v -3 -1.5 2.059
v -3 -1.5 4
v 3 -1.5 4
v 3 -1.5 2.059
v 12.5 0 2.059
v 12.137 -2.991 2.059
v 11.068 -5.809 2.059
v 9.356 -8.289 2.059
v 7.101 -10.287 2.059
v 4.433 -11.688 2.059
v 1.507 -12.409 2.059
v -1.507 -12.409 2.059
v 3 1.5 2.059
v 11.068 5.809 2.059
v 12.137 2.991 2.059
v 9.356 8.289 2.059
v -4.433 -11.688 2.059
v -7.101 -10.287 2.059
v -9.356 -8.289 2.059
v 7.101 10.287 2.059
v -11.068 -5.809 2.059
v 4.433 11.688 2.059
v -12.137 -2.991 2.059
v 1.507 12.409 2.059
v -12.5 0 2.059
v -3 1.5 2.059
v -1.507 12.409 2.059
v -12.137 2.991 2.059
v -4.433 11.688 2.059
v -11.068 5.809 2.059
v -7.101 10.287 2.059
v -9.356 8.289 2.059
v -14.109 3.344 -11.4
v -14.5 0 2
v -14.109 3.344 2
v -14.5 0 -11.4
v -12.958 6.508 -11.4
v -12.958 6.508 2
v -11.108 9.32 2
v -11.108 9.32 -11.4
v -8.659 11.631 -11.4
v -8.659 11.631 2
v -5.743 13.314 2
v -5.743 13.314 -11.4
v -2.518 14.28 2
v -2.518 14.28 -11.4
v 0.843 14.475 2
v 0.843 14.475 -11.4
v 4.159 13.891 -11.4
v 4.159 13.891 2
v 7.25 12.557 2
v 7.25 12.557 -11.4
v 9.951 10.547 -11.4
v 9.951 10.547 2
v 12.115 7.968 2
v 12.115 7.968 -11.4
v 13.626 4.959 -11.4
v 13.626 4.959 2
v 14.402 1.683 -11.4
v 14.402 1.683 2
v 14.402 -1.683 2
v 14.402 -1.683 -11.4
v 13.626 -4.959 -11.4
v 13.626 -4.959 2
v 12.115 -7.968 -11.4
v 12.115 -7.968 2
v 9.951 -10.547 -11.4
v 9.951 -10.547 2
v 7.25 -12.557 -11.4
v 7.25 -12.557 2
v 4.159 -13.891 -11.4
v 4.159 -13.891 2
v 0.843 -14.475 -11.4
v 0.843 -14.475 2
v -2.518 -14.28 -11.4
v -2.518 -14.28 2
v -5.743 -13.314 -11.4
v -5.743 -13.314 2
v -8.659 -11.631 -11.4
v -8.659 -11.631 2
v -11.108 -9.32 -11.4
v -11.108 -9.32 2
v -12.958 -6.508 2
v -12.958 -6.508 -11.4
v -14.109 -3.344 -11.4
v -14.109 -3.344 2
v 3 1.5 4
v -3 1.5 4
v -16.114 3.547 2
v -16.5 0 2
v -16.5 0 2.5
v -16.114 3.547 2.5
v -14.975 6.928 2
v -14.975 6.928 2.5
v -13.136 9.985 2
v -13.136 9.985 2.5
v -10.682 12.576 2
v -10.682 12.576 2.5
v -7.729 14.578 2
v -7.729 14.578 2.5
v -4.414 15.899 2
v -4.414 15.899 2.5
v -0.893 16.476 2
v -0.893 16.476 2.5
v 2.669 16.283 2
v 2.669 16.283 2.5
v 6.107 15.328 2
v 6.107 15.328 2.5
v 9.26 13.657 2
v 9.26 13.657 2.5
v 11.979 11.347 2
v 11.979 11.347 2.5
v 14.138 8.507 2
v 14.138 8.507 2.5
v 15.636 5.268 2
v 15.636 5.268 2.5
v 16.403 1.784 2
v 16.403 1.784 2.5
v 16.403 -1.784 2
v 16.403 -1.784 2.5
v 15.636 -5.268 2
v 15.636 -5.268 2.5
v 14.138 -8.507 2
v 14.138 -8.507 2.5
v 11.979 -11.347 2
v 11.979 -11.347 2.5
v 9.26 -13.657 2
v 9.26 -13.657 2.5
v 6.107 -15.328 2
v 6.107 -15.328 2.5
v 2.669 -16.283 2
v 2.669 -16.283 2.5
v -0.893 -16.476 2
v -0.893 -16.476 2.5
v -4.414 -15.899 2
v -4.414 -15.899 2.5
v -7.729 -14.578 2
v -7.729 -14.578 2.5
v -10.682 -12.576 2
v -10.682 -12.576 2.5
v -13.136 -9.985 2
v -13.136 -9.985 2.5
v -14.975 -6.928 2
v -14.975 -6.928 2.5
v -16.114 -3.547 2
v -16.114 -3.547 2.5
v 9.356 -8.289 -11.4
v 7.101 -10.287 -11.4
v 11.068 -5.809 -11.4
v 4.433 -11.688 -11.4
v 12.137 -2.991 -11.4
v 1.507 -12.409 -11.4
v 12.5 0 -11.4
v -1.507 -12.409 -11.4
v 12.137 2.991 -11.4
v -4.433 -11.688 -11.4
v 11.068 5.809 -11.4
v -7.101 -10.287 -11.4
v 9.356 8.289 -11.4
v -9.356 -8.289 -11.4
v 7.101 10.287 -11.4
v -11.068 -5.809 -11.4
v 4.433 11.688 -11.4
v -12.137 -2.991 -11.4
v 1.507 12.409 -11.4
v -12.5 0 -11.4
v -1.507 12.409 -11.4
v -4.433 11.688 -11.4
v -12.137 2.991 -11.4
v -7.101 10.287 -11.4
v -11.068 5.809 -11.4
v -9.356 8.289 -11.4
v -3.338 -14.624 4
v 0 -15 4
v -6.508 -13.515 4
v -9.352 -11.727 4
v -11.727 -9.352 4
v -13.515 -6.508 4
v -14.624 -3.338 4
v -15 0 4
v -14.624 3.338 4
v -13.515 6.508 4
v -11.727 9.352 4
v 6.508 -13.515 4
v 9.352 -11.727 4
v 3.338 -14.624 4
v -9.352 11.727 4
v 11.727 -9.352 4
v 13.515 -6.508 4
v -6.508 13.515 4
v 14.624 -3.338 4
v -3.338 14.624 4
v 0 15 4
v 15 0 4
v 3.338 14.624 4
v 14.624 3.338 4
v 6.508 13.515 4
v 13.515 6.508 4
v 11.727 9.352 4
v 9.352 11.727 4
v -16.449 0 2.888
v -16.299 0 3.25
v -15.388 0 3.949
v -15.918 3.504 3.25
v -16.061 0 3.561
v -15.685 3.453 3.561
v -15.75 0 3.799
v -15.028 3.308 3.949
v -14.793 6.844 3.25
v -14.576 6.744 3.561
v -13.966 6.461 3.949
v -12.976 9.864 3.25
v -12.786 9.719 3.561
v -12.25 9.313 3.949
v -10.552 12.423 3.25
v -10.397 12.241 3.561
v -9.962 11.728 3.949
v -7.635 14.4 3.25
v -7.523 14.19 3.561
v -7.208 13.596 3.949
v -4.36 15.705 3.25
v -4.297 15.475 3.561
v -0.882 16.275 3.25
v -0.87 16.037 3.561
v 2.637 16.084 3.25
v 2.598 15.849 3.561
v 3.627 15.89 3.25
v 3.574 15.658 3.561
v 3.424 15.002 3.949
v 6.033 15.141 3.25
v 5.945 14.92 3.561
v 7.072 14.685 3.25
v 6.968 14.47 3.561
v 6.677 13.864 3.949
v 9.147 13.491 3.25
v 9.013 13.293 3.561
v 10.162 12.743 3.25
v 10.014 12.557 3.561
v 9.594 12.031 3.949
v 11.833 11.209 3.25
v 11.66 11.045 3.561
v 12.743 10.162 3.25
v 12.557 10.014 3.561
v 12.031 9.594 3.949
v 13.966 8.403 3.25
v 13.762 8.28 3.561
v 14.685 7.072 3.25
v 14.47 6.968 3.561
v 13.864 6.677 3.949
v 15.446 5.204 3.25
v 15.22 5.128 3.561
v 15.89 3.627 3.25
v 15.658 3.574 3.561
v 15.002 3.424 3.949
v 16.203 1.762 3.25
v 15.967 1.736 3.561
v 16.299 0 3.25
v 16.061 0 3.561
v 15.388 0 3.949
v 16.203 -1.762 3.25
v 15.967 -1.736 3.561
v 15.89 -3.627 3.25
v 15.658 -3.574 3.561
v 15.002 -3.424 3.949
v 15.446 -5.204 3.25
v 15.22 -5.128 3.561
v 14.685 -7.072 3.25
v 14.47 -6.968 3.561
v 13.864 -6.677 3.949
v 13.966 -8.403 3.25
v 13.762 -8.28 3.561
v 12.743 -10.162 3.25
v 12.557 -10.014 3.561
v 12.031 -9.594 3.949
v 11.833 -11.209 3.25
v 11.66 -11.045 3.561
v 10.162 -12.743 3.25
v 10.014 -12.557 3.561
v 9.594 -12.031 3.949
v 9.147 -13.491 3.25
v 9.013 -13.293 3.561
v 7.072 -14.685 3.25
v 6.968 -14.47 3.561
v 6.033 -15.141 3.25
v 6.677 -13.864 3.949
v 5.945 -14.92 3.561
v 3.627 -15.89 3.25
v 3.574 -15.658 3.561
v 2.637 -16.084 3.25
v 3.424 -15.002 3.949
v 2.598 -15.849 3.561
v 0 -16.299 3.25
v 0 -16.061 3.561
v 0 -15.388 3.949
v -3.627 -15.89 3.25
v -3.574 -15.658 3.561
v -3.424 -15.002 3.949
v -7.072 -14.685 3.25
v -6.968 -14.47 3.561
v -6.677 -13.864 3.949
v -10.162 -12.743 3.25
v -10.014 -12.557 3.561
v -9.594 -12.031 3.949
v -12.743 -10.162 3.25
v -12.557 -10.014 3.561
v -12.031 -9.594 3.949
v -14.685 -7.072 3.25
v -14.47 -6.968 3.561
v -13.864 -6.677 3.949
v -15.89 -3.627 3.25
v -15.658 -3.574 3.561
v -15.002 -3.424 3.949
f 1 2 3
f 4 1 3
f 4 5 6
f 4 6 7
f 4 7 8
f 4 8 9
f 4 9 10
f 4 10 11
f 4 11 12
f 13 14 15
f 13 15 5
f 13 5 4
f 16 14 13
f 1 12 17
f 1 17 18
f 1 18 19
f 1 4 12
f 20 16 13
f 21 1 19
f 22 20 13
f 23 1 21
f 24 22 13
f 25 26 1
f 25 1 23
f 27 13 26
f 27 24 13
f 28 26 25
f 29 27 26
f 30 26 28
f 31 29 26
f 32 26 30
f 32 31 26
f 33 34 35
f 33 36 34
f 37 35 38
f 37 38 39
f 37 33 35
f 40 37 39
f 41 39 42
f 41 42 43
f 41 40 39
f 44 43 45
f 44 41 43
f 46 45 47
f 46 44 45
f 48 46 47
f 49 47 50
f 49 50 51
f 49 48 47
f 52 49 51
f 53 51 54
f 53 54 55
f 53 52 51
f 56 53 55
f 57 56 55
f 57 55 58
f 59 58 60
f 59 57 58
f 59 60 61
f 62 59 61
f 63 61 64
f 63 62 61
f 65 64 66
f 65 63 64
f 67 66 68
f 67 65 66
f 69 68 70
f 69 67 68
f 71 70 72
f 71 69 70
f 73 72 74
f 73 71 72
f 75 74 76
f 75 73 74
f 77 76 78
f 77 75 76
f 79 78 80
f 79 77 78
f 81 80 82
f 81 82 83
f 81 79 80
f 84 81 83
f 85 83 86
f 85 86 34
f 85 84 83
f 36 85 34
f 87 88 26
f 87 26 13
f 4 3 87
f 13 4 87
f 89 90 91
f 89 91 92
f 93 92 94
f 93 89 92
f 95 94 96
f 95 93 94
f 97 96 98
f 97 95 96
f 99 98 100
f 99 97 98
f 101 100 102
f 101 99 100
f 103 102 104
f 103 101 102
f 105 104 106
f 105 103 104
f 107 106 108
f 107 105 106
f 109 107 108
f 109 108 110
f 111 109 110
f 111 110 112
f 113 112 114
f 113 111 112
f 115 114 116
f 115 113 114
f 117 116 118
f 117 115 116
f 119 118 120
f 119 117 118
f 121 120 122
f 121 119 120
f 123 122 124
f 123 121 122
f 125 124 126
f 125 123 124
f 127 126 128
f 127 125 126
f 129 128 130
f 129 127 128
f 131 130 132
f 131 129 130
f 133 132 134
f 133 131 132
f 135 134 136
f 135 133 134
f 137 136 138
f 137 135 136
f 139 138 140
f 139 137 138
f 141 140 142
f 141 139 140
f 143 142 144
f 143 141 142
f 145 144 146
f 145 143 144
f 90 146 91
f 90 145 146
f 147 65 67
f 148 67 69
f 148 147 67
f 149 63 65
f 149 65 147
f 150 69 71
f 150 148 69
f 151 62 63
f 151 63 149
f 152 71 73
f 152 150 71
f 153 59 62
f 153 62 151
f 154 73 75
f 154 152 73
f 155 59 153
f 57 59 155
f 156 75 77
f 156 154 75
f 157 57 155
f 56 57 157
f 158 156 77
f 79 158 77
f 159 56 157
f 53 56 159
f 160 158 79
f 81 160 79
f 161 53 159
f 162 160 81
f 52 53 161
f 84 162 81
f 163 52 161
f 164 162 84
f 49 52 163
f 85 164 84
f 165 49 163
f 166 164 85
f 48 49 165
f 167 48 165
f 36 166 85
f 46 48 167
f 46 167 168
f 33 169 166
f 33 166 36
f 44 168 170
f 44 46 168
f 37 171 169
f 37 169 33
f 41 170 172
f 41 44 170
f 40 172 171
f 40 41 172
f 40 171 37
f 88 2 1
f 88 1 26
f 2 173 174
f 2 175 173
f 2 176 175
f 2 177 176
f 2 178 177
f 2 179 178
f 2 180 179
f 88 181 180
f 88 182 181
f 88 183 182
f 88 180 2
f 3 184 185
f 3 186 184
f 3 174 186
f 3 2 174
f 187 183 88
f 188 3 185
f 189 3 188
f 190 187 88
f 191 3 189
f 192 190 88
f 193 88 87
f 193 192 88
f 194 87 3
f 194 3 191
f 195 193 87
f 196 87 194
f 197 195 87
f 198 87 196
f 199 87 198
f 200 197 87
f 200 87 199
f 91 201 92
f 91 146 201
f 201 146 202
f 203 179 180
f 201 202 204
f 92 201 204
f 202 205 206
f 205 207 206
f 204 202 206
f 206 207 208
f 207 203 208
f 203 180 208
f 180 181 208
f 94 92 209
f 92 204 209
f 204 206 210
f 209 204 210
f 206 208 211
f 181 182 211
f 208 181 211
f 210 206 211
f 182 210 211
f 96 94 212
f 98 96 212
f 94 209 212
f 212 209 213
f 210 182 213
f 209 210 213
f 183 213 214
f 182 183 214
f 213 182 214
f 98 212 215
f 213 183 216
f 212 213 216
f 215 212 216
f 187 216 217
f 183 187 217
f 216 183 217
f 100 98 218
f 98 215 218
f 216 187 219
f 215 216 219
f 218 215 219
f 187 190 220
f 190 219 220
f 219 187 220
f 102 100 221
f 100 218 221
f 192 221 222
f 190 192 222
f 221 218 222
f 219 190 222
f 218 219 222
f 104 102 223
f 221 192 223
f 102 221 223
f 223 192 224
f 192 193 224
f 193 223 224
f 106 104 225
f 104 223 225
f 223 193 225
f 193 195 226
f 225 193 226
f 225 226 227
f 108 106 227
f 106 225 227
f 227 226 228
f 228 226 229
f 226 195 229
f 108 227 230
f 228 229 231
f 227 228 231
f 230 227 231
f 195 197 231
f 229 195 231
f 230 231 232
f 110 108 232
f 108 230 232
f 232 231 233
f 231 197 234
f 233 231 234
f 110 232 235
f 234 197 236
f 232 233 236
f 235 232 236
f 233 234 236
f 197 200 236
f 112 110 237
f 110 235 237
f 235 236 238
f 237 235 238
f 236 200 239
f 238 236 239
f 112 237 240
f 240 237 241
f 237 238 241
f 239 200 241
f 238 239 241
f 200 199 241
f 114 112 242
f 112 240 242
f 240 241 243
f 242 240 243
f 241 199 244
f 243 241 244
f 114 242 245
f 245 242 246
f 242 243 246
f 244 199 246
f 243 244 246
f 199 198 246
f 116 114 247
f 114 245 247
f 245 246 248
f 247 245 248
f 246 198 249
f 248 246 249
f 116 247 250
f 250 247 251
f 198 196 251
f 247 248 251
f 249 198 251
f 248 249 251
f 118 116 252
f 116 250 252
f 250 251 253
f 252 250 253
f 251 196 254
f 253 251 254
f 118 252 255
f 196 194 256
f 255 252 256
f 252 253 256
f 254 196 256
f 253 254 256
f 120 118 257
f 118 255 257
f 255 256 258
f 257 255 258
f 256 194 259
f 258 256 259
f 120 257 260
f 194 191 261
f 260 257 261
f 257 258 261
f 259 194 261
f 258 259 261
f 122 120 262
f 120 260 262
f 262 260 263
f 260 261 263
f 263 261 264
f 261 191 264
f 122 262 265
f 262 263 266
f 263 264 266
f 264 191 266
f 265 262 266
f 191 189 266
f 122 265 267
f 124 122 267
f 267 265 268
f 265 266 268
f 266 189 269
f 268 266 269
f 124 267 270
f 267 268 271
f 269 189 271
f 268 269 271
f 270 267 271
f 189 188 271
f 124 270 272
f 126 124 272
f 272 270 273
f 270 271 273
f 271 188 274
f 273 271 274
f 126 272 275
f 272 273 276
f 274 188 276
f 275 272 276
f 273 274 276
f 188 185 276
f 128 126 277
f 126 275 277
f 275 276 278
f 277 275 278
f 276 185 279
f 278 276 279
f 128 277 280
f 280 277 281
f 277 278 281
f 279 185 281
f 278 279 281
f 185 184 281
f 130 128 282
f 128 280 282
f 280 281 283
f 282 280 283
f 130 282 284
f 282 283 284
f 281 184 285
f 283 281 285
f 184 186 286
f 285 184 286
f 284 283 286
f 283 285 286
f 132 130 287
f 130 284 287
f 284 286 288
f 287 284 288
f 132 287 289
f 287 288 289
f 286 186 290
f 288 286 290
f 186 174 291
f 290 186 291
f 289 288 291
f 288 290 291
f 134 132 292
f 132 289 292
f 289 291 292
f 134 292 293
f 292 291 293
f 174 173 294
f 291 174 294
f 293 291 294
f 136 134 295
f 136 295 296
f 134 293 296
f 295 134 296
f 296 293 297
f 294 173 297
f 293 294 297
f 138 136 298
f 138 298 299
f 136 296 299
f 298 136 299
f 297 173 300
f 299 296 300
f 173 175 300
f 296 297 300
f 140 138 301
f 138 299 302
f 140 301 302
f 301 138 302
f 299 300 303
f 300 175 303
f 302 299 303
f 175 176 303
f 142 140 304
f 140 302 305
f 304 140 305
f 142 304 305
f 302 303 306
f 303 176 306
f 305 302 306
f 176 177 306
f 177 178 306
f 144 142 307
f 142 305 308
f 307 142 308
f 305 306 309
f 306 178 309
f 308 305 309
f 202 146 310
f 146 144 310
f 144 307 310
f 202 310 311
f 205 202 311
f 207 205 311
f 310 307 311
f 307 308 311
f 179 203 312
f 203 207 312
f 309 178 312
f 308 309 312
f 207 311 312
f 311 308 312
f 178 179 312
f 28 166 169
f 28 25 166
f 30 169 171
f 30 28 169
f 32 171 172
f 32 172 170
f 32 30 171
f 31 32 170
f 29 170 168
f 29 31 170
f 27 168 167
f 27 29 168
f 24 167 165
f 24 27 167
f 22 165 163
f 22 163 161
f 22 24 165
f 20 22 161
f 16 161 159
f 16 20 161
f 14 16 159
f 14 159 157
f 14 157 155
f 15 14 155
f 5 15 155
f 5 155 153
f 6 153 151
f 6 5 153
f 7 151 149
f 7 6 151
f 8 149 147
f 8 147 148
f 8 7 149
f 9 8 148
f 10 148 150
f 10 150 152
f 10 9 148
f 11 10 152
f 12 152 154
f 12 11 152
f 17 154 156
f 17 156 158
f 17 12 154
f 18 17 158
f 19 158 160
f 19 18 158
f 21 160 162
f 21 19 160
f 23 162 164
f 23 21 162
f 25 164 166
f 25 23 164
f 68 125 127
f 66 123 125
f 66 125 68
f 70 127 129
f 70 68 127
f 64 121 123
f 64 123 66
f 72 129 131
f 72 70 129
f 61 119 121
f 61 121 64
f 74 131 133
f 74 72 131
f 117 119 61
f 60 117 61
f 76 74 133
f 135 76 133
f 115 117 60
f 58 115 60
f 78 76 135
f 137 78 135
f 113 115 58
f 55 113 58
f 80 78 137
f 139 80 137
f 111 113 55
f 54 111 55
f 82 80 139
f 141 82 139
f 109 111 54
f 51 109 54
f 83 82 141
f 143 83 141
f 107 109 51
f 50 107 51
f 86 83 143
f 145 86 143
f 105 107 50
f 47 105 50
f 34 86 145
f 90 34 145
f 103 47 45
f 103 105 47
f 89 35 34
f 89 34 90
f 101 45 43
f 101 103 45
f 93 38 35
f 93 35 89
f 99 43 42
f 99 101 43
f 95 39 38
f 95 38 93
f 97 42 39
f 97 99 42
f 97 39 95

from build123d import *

# Parameters (mm, degrees)
F2_W     = 6
F2_H     = 3
F3_DEPTH = 25
F4_R     = 1.5


with BuildPart() as f1:
    # F0 (on Front) → F1 (revolve)
    with BuildSketch(Plane.XZ):
        Polygon((-16.5, 2), (-14.5, 2), (-14.5, -11.4), (-12.5, -11.4), (-12.5, 2.059244), (0, 2.059244), (0, 4), (-16.5, 4), align=None)
    revolve(axis=Axis((0, 0, -8.009328), (0, 0, -1)))

    # F2 (on face) → F3 (cut)
    with BuildSketch(Plane.XY.offset(4)):
        Rectangle(F2_W, F2_H)
    extrude(amount=-F3_DEPTH, mode=Mode.SUBTRACT)

    # F4
    f4_edges = [f1.edges().sort_by_distance(p)[0] for p in [
        (16.5, 0, 4),
    ]]
    fillet(f4_edges, radius=F4_R)


solid = f1.part
